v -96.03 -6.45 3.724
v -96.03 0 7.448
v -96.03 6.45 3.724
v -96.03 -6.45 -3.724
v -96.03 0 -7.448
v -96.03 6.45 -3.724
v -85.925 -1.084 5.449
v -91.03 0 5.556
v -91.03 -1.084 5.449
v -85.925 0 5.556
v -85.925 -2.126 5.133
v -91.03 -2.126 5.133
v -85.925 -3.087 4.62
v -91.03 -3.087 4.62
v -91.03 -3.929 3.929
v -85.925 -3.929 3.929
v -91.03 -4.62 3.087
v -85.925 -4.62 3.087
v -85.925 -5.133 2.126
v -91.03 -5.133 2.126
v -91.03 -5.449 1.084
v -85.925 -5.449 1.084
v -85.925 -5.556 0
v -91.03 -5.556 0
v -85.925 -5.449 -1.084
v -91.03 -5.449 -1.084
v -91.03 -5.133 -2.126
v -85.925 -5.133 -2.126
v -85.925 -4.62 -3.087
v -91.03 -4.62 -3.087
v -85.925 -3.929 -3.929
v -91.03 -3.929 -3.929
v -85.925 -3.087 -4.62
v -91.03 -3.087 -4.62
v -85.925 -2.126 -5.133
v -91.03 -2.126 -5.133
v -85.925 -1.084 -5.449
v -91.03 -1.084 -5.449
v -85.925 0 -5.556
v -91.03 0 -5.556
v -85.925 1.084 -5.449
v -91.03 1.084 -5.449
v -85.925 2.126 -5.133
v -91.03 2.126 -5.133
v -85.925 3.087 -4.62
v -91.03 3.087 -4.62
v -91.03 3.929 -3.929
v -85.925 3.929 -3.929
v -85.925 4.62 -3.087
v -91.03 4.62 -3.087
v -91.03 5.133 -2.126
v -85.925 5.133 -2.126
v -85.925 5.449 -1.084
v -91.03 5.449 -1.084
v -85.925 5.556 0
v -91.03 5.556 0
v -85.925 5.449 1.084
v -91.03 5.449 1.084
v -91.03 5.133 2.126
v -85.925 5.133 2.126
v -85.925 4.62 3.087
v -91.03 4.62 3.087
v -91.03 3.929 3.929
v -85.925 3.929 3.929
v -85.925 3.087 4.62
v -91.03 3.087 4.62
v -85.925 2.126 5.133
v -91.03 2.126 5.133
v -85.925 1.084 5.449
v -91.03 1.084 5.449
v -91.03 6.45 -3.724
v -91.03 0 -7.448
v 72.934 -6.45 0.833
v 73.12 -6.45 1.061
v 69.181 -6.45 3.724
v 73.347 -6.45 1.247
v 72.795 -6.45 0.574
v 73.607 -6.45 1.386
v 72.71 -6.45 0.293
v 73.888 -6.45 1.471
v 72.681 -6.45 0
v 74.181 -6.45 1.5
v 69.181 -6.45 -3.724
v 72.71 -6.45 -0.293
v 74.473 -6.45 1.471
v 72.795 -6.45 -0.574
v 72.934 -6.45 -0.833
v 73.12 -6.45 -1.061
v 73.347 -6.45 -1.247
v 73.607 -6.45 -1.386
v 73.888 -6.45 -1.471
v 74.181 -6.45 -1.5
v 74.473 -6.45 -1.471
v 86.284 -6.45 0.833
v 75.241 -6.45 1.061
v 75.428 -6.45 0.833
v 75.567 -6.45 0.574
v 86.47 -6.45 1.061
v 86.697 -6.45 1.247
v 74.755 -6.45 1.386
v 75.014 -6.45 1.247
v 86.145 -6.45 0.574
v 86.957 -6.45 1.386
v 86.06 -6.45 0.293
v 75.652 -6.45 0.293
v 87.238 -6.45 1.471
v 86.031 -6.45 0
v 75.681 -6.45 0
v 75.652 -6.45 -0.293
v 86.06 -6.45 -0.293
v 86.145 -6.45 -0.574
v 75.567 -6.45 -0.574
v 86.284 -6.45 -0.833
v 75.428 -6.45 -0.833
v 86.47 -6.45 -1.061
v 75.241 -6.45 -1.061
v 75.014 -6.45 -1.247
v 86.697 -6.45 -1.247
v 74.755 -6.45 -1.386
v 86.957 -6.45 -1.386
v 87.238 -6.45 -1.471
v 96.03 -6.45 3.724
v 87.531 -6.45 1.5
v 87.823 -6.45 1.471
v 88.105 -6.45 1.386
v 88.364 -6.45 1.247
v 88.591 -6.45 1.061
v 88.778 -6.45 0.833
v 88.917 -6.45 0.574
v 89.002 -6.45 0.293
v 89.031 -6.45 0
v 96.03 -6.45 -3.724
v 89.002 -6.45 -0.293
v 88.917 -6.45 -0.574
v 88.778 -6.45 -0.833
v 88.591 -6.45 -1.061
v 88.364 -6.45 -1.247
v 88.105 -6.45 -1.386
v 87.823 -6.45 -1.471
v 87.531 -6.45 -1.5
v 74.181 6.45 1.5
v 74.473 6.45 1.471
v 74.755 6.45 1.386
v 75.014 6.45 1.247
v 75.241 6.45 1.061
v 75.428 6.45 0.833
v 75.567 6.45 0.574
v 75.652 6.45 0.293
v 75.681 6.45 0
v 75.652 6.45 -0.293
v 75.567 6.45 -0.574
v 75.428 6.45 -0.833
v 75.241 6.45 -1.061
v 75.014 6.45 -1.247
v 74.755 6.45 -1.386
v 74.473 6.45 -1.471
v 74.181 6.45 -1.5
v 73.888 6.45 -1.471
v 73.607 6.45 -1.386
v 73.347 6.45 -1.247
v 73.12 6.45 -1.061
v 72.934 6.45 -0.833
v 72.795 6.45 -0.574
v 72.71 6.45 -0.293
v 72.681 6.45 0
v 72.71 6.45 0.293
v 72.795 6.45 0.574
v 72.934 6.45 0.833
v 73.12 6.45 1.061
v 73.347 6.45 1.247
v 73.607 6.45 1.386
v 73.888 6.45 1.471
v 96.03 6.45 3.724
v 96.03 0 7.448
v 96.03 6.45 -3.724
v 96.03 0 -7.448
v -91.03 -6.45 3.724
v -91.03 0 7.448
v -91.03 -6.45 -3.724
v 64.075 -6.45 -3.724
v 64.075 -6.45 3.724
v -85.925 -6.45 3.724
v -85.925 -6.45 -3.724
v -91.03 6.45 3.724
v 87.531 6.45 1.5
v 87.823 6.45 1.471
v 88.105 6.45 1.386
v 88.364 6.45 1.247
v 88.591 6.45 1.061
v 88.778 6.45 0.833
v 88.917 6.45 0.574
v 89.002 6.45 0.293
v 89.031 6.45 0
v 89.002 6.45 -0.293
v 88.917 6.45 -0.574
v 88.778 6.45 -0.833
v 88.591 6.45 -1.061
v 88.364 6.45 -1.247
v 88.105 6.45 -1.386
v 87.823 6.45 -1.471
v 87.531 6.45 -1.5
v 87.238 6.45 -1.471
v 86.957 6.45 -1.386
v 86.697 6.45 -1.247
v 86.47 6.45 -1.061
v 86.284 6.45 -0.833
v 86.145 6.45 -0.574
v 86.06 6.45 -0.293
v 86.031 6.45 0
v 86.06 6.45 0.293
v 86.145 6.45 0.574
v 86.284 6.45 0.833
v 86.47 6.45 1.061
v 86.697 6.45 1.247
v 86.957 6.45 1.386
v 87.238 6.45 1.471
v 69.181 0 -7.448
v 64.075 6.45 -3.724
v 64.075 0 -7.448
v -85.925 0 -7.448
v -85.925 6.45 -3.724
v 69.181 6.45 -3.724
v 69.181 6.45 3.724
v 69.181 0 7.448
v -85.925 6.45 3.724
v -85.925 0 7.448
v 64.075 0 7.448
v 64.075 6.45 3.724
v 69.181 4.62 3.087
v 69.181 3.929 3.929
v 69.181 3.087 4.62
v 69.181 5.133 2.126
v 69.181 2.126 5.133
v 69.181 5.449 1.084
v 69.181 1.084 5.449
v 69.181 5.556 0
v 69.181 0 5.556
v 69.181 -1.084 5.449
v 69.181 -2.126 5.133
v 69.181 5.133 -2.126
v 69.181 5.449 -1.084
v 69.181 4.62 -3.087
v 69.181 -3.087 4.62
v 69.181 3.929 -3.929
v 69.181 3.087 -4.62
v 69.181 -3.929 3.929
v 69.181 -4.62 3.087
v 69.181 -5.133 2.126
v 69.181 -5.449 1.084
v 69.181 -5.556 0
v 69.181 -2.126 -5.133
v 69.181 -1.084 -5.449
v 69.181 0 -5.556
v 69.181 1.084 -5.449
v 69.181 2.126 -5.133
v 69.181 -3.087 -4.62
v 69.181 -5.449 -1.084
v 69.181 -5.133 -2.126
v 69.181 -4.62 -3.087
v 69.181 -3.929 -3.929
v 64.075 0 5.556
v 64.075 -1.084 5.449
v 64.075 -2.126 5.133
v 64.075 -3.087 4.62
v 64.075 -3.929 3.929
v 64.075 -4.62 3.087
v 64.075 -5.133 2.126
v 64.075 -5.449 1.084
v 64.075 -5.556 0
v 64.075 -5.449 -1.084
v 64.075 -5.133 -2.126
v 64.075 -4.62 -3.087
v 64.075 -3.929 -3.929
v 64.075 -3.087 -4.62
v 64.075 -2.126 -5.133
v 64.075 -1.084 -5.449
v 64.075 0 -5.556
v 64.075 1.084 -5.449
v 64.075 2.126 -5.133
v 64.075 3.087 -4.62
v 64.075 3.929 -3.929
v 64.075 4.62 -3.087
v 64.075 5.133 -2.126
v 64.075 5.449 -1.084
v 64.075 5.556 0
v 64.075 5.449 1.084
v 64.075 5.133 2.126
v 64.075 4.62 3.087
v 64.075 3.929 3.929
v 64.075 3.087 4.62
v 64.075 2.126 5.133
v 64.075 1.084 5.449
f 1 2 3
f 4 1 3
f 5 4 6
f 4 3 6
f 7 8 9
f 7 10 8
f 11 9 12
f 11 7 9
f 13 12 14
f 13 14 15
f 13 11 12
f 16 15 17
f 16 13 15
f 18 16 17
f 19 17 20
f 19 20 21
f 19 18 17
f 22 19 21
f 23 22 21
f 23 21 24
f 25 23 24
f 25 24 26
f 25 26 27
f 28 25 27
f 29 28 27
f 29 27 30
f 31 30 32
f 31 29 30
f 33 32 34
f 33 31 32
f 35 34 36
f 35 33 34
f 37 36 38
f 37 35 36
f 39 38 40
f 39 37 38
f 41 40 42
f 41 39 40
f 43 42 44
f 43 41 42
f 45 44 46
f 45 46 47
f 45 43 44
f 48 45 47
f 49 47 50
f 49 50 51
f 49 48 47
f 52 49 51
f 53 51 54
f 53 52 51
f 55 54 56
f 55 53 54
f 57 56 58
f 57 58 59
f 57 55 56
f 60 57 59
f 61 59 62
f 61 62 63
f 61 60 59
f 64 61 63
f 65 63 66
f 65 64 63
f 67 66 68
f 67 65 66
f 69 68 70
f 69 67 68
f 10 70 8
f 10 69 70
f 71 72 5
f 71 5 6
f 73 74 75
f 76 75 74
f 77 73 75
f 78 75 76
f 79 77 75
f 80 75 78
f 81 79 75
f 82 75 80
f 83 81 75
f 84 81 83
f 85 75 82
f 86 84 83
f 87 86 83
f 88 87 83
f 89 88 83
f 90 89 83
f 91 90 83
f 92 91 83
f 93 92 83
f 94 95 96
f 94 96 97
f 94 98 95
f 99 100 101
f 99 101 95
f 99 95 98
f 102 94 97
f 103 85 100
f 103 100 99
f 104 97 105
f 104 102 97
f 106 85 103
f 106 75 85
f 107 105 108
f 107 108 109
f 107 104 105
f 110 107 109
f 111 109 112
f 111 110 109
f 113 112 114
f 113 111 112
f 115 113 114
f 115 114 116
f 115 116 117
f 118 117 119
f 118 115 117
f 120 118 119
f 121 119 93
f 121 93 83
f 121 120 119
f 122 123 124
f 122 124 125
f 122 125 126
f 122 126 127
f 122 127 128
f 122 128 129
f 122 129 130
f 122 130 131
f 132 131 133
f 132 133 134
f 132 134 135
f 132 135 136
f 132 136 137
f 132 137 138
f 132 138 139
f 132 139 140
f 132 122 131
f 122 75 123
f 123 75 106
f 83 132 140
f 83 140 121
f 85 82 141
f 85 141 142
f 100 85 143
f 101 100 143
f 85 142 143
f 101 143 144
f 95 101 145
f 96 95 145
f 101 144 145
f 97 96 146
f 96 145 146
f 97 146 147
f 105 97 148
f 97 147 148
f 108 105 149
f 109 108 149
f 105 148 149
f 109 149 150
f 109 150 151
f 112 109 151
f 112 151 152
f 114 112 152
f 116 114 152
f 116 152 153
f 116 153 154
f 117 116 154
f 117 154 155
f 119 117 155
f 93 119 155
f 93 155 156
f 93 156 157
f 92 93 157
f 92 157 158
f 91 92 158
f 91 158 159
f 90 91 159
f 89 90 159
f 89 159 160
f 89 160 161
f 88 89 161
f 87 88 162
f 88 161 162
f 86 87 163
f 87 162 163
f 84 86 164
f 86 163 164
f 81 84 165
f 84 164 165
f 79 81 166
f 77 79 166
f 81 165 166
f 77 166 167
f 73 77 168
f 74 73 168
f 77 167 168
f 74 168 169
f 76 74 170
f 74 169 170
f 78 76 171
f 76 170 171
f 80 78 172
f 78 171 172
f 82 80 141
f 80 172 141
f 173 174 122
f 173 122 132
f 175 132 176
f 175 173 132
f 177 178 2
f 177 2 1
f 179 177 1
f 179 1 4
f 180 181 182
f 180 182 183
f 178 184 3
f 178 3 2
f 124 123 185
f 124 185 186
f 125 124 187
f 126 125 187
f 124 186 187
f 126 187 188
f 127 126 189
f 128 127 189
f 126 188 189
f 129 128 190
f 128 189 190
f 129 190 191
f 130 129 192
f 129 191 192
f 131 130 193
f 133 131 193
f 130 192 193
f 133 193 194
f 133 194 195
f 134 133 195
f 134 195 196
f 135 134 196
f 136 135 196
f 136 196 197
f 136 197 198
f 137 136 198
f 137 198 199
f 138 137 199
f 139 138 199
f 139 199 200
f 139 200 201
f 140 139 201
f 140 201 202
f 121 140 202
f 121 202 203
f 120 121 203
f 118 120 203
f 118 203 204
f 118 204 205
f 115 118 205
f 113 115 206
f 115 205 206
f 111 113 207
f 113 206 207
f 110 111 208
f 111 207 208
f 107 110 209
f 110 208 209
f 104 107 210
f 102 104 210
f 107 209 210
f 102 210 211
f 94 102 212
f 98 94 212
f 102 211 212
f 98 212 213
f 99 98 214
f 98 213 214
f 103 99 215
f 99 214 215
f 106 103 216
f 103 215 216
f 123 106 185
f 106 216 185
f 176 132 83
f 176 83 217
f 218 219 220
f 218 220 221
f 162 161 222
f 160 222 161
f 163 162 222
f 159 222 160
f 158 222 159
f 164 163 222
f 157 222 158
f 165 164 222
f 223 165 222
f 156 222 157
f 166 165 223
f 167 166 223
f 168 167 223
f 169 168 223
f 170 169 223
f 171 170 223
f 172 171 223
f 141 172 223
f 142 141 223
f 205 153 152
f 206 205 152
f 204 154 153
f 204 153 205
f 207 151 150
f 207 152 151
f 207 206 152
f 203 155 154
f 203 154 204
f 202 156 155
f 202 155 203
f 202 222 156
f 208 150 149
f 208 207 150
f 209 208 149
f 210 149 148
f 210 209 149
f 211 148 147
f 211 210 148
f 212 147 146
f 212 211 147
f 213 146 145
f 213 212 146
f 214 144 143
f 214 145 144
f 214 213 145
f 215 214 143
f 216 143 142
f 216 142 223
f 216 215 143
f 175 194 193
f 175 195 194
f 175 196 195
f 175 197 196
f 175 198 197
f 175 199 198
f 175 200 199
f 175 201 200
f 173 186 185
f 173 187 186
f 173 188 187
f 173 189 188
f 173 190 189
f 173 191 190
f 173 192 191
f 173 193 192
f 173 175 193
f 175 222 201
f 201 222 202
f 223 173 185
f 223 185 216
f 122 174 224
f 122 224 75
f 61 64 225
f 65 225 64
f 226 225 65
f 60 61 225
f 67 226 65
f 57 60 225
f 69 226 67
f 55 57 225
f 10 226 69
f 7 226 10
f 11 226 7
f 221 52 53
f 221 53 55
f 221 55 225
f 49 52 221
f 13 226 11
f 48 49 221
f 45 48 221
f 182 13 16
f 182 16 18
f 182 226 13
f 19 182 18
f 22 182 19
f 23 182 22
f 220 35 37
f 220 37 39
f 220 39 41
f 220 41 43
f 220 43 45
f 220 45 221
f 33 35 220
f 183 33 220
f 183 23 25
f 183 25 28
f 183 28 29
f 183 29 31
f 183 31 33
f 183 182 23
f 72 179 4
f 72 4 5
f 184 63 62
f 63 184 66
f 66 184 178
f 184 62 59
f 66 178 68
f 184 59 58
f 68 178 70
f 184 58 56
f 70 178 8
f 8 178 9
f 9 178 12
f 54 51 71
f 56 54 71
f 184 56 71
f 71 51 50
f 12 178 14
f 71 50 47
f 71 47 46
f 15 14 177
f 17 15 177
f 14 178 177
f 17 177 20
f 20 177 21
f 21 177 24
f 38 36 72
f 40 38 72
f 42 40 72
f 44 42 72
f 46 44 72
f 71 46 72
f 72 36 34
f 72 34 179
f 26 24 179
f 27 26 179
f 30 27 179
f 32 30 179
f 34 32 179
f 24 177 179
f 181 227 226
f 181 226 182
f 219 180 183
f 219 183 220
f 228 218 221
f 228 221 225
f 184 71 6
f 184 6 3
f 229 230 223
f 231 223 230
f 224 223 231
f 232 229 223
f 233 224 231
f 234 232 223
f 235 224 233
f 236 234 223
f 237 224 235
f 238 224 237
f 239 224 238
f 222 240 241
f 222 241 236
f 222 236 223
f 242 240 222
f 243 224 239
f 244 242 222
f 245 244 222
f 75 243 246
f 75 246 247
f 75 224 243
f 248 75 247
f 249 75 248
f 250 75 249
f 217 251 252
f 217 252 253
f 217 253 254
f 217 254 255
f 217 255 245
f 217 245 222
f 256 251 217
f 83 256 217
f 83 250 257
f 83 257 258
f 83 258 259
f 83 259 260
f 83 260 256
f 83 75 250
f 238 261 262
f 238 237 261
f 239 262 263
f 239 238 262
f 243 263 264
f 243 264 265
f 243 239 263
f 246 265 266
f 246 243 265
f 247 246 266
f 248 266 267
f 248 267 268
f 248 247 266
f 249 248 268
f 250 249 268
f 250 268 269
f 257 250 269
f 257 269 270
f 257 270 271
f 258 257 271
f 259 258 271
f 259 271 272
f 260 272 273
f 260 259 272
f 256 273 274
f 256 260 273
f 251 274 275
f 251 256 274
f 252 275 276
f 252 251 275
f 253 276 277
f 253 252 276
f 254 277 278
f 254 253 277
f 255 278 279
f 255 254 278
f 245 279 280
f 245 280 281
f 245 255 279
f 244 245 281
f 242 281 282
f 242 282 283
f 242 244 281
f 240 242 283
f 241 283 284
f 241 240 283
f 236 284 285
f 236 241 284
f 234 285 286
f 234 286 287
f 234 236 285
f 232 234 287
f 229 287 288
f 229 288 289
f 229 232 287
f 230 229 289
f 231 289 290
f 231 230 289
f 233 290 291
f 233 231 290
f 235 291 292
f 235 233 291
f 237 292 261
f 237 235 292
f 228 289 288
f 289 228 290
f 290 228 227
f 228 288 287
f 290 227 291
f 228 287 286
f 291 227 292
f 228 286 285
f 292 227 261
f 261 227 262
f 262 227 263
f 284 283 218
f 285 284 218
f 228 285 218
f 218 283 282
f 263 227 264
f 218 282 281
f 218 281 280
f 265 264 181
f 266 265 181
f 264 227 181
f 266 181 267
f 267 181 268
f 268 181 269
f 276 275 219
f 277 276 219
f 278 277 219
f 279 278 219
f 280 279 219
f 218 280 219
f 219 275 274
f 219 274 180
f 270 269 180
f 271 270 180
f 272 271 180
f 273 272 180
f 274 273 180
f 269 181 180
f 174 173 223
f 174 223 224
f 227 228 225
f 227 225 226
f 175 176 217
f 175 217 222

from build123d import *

# Parameters (mm, degrees)
BOSS_EXTRUDE1_DEPTH = 96.03
SKETCH2_W           = 5.1054
SKETCH2_H           = 5.89375
SKETCH3_R           = 1.5
CUT_EXTRUDE1_DEPTH  = 98.178397291


with BuildPart() as part:
    # Sketch1 → Boss-Extrude1 (new, symmetric)
    with BuildSketch(Plane(origin=(0, 0, 0), x_dir=(0, 0, -1), z_dir=(1, 0, 0))):
        Polygon((7.447818473, 0), (3.723909236, 6.45), (-3.723909236, 6.45), (-7.447818473, 0), (-3.723909236, -6.45), (3.723909236, -6.45), align=None)
    extrude(amount=BOSS_EXTRUDE1_DEPTH, both=True)

    # Sketch2 → Cut-Revolve1 (revolve, cut)
    with BuildSketch(Plane.XY, mode=Mode.PRIVATE) as cut_revolve1_sk:
        with Locations((-88.4773, 8.503125)):
            Rectangle(SKETCH2_W, SKETCH2_H)
        with Locations((66.6281, 8.503125)):
            Rectangle(SKETCH2_W, SKETCH2_H)
    revolve(cut_revolve1_sk.sketch.rotate(Axis((-251.263286978, 0, 0), (1, 0, 0)), 90), axis=Axis((-251.263286978, 0, 0), (1, 0, 0)), mode=Mode.SUBTRACT)

    # Sketch3 → Cut-Extrude1 (cut, through all)
    with BuildSketch(Plane(origin=(0, 6.45, 0), x_dir=(1, 0, 0), z_dir=(0, 1, 0))):
        with Locations(Location((74.1808, 0, 0), (0, 0, 270))):
            Circle(SKETCH3_R)
        with Locations(Location((87.5308, 0, 0), (0, 0, 270))):
            Circle(SKETCH3_R)
    extrude(amount=-CUT_EXTRUDE1_DEPTH, mode=Mode.SUBTRACT)


solid = part.part
